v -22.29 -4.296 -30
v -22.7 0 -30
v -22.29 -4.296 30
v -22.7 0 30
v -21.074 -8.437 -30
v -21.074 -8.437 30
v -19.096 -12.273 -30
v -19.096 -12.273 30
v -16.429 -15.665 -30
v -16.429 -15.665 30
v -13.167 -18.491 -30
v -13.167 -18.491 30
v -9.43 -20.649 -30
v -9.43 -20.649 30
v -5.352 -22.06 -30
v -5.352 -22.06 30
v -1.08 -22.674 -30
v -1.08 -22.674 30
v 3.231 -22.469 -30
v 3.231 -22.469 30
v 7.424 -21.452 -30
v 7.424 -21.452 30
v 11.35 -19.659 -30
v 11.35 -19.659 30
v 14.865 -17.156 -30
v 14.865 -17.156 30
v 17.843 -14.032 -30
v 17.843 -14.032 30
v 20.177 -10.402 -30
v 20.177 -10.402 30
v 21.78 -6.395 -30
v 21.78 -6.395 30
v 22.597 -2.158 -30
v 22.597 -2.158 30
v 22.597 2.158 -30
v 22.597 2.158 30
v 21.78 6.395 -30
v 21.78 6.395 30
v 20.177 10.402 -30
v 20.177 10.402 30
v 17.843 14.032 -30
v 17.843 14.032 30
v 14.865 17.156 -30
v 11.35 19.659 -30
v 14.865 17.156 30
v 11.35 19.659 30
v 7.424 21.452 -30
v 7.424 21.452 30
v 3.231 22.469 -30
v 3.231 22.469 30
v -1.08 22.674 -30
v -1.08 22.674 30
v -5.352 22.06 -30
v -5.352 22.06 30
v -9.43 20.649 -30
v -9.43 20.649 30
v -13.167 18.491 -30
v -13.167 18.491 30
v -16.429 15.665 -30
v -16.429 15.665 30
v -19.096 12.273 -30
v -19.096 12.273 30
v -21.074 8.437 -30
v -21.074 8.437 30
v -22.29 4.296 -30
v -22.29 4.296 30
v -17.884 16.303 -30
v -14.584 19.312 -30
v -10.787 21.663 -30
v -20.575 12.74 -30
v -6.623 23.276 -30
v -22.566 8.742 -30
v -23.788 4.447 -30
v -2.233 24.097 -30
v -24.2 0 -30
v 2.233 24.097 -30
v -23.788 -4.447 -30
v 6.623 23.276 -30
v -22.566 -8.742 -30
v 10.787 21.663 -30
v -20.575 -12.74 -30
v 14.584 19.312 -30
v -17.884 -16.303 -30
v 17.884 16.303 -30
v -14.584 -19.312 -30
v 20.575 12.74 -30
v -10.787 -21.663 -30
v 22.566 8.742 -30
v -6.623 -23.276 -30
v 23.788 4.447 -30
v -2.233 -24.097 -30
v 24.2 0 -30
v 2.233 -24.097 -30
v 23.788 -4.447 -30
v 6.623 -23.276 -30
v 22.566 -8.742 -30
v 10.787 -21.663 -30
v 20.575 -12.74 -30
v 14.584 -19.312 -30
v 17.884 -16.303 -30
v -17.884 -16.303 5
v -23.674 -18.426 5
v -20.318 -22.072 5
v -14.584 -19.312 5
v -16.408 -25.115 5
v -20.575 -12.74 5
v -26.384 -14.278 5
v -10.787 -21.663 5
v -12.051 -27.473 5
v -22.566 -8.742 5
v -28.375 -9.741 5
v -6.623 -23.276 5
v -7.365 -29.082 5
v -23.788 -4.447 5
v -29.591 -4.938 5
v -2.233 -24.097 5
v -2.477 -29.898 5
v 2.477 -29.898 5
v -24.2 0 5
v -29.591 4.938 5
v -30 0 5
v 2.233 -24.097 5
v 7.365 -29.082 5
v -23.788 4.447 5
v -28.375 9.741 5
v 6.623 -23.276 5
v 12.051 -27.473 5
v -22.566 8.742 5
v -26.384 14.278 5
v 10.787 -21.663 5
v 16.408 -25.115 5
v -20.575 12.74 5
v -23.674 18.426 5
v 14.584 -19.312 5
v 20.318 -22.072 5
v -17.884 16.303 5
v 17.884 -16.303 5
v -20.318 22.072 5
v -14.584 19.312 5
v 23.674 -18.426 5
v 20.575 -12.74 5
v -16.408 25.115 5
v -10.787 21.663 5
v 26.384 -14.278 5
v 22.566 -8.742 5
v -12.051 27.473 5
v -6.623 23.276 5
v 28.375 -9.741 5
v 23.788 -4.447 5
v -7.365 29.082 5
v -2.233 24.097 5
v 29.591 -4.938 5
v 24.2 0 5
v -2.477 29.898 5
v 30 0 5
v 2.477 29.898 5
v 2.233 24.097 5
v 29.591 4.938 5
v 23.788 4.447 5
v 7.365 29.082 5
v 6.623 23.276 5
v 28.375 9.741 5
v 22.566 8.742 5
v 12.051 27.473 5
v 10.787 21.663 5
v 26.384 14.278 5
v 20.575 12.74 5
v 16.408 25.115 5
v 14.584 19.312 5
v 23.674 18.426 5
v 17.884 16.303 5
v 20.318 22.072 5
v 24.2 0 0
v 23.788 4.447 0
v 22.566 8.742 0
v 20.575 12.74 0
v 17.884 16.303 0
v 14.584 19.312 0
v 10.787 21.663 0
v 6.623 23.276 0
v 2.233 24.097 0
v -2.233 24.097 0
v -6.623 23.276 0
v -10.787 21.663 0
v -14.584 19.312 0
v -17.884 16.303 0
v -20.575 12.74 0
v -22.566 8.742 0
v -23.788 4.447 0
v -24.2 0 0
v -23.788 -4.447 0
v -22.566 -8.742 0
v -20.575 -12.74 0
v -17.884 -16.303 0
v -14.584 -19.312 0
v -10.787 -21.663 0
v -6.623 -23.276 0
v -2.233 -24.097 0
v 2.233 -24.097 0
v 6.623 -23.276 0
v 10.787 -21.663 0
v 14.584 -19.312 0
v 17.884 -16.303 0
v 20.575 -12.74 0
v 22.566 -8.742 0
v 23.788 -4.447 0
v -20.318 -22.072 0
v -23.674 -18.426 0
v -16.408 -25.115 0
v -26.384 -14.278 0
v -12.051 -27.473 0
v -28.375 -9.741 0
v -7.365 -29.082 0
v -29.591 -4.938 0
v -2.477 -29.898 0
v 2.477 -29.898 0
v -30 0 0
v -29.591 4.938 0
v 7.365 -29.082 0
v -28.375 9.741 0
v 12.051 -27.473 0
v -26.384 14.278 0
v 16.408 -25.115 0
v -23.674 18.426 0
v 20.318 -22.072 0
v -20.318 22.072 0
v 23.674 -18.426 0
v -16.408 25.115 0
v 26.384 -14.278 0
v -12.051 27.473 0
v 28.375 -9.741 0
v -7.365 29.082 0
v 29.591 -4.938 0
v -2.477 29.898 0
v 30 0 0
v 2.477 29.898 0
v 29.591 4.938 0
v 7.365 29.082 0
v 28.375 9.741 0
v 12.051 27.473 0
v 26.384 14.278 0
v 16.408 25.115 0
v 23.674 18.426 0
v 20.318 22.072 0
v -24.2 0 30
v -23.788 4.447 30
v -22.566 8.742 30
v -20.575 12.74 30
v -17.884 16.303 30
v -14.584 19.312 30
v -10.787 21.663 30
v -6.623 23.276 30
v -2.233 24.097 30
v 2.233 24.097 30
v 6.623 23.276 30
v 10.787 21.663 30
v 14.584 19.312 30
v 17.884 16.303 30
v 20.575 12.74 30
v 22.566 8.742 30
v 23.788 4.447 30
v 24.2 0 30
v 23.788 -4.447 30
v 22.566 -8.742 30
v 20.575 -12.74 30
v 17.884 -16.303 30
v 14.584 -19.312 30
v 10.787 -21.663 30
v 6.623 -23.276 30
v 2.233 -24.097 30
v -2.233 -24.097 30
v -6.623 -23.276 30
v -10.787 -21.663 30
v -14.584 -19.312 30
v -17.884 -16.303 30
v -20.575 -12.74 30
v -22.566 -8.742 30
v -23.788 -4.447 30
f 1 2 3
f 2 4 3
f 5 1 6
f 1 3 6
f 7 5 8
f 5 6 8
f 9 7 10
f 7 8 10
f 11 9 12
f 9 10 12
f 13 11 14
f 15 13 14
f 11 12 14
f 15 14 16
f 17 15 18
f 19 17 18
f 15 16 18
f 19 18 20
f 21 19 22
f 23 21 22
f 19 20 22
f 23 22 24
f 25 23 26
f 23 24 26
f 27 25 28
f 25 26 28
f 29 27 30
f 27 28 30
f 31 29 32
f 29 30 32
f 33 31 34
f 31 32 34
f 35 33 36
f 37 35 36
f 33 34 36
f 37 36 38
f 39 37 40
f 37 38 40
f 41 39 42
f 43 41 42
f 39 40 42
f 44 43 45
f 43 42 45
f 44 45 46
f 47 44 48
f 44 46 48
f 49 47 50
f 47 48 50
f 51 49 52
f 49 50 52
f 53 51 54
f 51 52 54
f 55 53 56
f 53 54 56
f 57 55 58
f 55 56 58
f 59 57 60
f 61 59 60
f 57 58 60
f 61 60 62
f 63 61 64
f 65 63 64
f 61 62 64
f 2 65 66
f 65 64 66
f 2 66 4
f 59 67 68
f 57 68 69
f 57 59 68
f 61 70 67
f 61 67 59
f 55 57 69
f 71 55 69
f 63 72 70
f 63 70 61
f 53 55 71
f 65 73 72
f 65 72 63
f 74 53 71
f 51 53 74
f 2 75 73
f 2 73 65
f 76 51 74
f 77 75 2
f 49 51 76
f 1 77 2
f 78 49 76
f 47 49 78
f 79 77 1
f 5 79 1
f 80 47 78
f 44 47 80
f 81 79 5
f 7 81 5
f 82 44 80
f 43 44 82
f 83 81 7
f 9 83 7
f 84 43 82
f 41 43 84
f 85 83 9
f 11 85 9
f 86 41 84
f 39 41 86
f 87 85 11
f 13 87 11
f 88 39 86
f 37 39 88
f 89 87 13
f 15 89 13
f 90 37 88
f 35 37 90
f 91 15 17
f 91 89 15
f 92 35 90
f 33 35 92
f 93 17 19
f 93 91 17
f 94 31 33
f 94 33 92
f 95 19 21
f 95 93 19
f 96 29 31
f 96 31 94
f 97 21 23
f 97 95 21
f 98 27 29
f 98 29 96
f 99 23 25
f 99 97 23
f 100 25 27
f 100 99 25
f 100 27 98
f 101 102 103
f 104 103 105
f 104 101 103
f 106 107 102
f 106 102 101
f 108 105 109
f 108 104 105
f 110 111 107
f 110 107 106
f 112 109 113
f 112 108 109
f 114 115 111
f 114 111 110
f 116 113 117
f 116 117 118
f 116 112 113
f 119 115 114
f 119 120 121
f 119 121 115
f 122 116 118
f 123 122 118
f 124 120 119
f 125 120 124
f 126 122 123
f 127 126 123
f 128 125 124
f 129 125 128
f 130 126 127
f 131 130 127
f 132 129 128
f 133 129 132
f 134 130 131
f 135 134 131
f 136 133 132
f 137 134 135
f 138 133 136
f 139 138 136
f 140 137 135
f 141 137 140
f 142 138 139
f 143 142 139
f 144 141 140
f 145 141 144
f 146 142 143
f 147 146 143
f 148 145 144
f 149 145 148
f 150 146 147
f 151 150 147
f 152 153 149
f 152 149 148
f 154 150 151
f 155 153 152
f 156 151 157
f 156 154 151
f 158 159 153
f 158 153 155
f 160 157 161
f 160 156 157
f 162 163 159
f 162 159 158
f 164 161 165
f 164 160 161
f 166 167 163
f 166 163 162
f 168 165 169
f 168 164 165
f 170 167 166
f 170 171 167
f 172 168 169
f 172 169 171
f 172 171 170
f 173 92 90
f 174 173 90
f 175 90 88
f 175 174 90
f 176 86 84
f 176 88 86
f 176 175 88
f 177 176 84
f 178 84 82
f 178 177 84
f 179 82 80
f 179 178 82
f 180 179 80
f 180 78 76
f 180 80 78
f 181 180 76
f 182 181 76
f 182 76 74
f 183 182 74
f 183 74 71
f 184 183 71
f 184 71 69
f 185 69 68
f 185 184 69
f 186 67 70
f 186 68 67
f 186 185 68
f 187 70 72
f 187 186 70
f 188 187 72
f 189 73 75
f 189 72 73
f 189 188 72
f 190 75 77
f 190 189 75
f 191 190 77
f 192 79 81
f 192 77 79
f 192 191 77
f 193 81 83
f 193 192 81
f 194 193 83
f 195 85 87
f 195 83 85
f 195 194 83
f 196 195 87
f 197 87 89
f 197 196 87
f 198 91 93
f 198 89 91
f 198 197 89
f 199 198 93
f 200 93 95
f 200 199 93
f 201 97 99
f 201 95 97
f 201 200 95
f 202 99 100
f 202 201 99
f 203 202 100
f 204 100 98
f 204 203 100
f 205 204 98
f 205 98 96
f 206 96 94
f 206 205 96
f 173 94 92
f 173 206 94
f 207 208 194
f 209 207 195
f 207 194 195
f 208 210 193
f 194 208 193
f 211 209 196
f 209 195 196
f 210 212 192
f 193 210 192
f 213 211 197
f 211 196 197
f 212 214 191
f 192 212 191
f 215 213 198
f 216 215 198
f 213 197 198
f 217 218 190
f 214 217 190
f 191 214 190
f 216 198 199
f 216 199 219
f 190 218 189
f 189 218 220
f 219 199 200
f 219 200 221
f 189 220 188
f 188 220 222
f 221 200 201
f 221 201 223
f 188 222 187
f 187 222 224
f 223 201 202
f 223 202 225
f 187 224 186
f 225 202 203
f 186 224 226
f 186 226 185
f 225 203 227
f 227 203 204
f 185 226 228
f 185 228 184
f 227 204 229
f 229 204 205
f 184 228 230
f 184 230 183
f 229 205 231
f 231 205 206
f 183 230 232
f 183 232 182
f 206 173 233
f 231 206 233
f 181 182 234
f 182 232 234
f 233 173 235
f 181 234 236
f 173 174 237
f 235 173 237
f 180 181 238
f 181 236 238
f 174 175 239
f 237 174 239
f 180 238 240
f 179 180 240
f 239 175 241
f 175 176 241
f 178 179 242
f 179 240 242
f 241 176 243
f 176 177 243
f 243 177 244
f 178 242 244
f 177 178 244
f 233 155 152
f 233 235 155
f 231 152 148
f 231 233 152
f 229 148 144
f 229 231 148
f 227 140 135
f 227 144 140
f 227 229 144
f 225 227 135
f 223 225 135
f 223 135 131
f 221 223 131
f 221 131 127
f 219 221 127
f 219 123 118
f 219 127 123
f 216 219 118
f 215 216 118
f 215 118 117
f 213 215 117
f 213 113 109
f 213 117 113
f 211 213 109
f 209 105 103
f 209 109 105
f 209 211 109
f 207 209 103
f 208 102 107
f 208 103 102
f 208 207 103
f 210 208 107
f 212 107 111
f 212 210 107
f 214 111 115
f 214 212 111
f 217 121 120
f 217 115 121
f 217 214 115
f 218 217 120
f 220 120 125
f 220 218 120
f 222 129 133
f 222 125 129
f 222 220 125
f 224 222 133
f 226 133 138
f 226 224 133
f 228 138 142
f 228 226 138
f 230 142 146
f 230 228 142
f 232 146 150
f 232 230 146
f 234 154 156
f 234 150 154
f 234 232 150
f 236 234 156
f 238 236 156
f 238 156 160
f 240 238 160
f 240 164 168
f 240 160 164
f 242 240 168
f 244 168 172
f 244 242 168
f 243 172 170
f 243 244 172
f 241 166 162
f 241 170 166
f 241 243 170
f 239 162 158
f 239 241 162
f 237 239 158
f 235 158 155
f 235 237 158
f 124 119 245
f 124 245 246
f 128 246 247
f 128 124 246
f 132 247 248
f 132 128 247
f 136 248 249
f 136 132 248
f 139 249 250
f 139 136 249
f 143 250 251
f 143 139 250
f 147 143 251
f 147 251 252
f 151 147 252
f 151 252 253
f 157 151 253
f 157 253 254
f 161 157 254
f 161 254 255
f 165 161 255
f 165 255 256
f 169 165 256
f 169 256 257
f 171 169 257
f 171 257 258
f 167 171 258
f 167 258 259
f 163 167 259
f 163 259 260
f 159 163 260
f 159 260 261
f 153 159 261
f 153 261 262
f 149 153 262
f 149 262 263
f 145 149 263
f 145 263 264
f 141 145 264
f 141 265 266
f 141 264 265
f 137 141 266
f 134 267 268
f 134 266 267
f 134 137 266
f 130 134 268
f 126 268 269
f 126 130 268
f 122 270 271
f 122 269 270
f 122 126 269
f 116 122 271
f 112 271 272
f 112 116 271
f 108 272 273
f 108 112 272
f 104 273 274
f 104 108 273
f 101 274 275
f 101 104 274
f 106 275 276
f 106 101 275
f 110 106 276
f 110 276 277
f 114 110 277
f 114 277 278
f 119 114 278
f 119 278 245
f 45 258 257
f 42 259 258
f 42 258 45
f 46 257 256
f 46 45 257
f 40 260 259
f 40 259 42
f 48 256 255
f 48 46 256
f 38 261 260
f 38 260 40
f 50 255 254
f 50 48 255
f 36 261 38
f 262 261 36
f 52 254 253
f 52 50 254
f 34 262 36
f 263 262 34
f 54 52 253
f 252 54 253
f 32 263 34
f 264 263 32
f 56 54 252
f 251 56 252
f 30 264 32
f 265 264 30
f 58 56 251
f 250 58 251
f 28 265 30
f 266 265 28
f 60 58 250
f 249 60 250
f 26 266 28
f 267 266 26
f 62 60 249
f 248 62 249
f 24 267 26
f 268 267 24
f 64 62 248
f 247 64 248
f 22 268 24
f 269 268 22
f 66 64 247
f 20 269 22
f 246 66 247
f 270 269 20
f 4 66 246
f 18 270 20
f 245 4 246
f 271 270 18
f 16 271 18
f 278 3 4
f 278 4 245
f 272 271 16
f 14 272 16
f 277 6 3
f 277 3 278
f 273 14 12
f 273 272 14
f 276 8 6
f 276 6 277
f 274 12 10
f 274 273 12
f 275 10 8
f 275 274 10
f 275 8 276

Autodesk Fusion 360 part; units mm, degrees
sketch "Sketch1" plane through (0, 0, 0) normal (0, 0, 1) x (1, 0, 0)
  circle A0 centre (0, 0) radius 30
  dimension "d1" = 60
extrude "Extrude1" add sketch "Sketch1" along normal blind 5
sketch "Sketch2" plane through (0, 0, 5) normal (0, 0, 1) x (-1, 0, 0)
  circle A0 centre (0, 0) radius 30
  circle A1 centre (0, 0) radius 24.2
  dimension "d4" = 48.4
extrude "Extrude2" add sketch "Sketch2" along normal blind 25 contours A1
sketch "Sketch3" plane through (0, 0, 0) normal (0, 0, -1) x (1, 0, 0)
  circle A0 centre (0, 0) radius 30
  circle A1 centre (0, 0) radius 24.2
extrude "Extrude3" add sketch "Sketch3" along normal blind 30 contours A1
sketch "Sketch4" plane through (0, 0, 30) normal (0, 0, 1) x (-1, 0, 0)
  circle A0 centre (0, 0) radius 24.2
  circle A1 centre (0, 0) radius 22.7
  dimension "d9" = -1.5
extrude "Extrude4" cut sketch "Sketch4" against normal blind 60 contours A1
